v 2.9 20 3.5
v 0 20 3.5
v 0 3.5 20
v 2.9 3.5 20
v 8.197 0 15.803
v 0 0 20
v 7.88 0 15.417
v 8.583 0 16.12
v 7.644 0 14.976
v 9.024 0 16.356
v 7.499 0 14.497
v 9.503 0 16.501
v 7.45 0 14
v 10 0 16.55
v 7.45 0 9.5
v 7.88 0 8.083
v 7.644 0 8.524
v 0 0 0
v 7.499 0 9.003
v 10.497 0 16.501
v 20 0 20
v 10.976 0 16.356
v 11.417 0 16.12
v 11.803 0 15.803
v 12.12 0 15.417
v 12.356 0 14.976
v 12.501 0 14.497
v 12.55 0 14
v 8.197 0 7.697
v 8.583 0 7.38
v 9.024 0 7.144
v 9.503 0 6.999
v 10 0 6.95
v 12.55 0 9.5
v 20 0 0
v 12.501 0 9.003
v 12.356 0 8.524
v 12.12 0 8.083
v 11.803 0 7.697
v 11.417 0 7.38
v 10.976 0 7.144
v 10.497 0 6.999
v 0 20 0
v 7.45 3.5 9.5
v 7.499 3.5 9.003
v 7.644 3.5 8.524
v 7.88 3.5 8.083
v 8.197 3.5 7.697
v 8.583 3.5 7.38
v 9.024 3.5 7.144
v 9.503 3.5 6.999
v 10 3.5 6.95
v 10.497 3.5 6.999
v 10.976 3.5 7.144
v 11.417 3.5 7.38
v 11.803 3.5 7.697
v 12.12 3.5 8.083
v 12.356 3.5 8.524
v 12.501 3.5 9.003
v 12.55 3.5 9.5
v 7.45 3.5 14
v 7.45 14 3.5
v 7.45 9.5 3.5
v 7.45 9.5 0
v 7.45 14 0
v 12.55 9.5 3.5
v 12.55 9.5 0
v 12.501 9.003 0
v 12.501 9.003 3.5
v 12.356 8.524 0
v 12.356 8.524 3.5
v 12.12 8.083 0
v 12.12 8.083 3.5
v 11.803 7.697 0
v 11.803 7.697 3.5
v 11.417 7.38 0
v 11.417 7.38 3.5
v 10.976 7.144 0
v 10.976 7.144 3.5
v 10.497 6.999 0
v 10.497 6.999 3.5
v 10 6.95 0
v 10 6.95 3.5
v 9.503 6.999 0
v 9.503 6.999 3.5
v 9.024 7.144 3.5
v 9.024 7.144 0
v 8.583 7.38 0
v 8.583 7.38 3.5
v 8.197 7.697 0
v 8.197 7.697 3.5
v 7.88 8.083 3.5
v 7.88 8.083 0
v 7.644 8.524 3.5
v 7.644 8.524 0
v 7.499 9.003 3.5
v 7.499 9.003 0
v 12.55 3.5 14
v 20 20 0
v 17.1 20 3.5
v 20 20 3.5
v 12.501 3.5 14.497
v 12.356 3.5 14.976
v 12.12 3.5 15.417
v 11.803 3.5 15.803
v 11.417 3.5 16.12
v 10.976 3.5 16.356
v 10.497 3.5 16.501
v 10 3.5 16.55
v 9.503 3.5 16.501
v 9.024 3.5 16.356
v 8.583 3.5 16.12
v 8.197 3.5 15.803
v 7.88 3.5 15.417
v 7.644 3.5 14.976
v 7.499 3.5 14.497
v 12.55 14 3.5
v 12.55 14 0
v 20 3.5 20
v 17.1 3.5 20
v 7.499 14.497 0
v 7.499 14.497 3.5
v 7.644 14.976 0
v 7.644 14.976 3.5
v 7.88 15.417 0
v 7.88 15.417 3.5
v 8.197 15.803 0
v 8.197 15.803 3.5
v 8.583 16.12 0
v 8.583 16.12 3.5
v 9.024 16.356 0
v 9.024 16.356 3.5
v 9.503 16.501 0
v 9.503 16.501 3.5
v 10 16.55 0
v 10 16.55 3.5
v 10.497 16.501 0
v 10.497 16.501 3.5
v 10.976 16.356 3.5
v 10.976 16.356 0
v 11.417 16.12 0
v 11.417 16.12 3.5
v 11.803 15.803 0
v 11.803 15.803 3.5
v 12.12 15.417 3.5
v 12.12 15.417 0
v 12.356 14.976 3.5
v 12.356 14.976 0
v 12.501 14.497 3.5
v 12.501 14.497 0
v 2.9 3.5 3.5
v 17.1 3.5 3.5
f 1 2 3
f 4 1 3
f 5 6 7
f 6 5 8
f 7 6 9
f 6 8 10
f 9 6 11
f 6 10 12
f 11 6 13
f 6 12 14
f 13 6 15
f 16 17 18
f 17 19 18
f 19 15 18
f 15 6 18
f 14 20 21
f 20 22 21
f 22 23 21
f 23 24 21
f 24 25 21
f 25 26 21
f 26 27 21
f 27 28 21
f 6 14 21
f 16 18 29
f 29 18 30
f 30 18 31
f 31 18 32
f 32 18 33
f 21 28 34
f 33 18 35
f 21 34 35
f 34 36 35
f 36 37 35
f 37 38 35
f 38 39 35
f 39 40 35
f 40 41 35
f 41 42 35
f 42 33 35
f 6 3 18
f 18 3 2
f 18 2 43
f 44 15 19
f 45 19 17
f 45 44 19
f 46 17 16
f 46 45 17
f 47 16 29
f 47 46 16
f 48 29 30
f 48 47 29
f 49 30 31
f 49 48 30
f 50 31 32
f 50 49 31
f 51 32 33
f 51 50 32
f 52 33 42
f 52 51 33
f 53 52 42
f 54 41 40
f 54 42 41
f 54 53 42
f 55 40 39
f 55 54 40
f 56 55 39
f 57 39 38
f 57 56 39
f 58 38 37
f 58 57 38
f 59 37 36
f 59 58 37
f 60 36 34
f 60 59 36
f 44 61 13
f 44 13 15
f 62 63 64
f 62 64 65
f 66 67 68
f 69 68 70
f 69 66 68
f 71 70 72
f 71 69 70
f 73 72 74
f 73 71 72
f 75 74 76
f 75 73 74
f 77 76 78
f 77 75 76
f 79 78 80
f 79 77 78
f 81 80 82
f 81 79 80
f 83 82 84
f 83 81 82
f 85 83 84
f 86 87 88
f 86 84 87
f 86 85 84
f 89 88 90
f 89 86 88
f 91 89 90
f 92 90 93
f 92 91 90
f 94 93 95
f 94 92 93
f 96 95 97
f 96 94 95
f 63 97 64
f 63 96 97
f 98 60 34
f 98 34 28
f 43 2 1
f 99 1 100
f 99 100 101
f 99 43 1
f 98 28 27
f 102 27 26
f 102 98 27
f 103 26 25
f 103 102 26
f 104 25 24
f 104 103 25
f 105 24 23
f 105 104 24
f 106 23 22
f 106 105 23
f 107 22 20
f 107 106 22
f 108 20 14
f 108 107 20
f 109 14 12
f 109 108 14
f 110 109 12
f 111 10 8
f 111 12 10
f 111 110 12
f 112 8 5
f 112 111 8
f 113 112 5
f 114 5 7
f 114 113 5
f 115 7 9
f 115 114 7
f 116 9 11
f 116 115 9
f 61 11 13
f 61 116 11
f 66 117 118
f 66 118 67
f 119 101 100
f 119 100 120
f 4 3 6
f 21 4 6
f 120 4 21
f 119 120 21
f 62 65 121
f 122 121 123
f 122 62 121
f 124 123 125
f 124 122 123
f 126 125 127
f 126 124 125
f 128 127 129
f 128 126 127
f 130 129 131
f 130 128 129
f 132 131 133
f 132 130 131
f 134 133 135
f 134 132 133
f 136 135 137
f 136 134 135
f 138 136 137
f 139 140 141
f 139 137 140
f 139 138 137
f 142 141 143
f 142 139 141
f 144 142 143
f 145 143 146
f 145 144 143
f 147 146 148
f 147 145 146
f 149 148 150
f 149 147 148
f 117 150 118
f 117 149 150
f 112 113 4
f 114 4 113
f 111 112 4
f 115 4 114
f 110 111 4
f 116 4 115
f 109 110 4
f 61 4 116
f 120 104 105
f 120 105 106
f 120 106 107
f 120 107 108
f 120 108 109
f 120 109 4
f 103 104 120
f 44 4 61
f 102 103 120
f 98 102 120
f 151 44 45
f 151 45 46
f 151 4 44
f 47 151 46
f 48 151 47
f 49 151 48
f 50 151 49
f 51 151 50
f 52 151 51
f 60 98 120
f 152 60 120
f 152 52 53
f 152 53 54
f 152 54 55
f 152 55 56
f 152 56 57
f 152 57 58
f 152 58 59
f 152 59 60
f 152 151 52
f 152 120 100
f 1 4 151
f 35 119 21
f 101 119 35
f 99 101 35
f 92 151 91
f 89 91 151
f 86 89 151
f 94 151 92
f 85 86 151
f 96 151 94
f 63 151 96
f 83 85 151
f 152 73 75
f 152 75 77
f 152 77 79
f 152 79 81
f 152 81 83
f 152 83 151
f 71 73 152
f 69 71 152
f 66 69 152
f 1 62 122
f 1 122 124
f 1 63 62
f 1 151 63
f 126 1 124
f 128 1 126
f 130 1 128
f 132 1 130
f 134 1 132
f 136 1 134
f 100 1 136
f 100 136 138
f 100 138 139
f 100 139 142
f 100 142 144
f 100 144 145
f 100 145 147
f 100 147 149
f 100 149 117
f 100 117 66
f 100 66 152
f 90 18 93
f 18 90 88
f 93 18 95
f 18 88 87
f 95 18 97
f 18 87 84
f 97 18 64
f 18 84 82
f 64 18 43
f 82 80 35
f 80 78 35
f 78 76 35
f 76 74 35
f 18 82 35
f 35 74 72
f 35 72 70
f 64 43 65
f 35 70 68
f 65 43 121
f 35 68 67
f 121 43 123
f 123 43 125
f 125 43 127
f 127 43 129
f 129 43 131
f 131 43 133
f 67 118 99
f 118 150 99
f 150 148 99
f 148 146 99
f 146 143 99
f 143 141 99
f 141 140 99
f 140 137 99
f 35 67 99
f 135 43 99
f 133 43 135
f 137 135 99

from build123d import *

# Parameters (mm, degrees)
SKETCH1_W          = 20
SKETCH1_H          = 20
EXTRUDE1_DEPTH     = 3.5
SKETCH2_W          = 20
SKETCH2_H          = 3.5
EXTRUDE2_DEPTH     = 16.5
EXTRUDE3_DEPTH     = 2.9
EXTRUDE4_DEPTH     = 2.9
CUT_EXTRUDE1_REACH = 5.5
CUT_EXTRUDE2_REACH = 5.5


with BuildPart() as part:
    # Sketch1 → Extrude1 (new body)
    with BuildSketch(Plane.XY):
        with Locations((10, 10)):
            Rectangle(SKETCH1_W, SKETCH1_H)
    extrude(amount=EXTRUDE1_DEPTH)

    # Sketch2 → Extrude2 (add)
    with BuildSketch(Plane.XY.offset(3.5)):
        with Locations((10, 1.75)):
            Rectangle(SKETCH2_W, SKETCH2_H)
    extrude(amount=EXTRUDE2_DEPTH)

    # Sketch5 → Extrude3 (add)
    with BuildSketch(Plane(origin=(20, 0, 0), x_dir=(0, 0, -1), z_dir=(1, 0, 0))):
        Polygon((-3.5, 20), (-20, 3.5), (-3.5, 3.5), align=None)
    extrude(amount=-EXTRUDE3_DEPTH)

    # Sketch6 → Extrude4 (add)
    with BuildSketch(Plane.ZY):
        Polygon((3.5, 20), (20, 3.5), (3.5, 3.5), align=None)
    extrude(amount=-EXTRUDE4_DEPTH)

    # Sketch7 → Cut-Extrude1 (cut, up to next)
    with BuildSketch(Plane(origin=(0, 3.5, 0), x_dir=(1, 0, 0), z_dir=(0, 1, 0)), mode=Mode.PRIVATE) as cut_extrude1_sk1:
        with BuildLine():
            Line((7.45, -14), (7.45, -9.5))
            ThreePointArc((7.45, -9.5), (10, -6.95), (12.55, -9.5))
            Line((12.55, -9.5), (12.55, -14))
            ThreePointArc((12.55, -14), (10, -16.55), (7.45, -14))
        make_face()
    cut_extrude1_tool1 = extrude(cut_extrude1_sk1.sketch, amount=-CUT_EXTRUDE1_REACH, mode=Mode.PRIVATE) & part.part
    add(cut_extrude1_tool1.solids().sort_by_distance((10, 3.5, 11.75))[0], mode=Mode.SUBTRACT)

    # Sketch8 → Cut-Extrude2 (cut, up to next)
    with BuildSketch(Plane(origin=(0, 0, 3.5), x_dir=(-1, 0, 0), z_dir=(0, 0, 1)), mode=Mode.PRIVATE) as cut_extrude2_sk1:
        with BuildLine():
            Line((-12.55, -14), (-12.55, -9.5))
            ThreePointArc((-12.55, -9.5), (-10, -6.95), (-7.45, -9.5))
            Line((-7.45, -9.5), (-7.45, -14))
            ThreePointArc((-7.45, -14), (-10, -16.55), (-12.55, -14))
        make_face()
    cut_extrude2_tool1 = extrude(cut_extrude2_sk1.sketch, amount=-CUT_EXTRUDE2_REACH, mode=Mode.PRIVATE) & part.part
    add(cut_extrude2_tool1.solids().sort_by_distance((10, 11.75, 3.5))[0], mode=Mode.SUBTRACT)


solid = part.part
